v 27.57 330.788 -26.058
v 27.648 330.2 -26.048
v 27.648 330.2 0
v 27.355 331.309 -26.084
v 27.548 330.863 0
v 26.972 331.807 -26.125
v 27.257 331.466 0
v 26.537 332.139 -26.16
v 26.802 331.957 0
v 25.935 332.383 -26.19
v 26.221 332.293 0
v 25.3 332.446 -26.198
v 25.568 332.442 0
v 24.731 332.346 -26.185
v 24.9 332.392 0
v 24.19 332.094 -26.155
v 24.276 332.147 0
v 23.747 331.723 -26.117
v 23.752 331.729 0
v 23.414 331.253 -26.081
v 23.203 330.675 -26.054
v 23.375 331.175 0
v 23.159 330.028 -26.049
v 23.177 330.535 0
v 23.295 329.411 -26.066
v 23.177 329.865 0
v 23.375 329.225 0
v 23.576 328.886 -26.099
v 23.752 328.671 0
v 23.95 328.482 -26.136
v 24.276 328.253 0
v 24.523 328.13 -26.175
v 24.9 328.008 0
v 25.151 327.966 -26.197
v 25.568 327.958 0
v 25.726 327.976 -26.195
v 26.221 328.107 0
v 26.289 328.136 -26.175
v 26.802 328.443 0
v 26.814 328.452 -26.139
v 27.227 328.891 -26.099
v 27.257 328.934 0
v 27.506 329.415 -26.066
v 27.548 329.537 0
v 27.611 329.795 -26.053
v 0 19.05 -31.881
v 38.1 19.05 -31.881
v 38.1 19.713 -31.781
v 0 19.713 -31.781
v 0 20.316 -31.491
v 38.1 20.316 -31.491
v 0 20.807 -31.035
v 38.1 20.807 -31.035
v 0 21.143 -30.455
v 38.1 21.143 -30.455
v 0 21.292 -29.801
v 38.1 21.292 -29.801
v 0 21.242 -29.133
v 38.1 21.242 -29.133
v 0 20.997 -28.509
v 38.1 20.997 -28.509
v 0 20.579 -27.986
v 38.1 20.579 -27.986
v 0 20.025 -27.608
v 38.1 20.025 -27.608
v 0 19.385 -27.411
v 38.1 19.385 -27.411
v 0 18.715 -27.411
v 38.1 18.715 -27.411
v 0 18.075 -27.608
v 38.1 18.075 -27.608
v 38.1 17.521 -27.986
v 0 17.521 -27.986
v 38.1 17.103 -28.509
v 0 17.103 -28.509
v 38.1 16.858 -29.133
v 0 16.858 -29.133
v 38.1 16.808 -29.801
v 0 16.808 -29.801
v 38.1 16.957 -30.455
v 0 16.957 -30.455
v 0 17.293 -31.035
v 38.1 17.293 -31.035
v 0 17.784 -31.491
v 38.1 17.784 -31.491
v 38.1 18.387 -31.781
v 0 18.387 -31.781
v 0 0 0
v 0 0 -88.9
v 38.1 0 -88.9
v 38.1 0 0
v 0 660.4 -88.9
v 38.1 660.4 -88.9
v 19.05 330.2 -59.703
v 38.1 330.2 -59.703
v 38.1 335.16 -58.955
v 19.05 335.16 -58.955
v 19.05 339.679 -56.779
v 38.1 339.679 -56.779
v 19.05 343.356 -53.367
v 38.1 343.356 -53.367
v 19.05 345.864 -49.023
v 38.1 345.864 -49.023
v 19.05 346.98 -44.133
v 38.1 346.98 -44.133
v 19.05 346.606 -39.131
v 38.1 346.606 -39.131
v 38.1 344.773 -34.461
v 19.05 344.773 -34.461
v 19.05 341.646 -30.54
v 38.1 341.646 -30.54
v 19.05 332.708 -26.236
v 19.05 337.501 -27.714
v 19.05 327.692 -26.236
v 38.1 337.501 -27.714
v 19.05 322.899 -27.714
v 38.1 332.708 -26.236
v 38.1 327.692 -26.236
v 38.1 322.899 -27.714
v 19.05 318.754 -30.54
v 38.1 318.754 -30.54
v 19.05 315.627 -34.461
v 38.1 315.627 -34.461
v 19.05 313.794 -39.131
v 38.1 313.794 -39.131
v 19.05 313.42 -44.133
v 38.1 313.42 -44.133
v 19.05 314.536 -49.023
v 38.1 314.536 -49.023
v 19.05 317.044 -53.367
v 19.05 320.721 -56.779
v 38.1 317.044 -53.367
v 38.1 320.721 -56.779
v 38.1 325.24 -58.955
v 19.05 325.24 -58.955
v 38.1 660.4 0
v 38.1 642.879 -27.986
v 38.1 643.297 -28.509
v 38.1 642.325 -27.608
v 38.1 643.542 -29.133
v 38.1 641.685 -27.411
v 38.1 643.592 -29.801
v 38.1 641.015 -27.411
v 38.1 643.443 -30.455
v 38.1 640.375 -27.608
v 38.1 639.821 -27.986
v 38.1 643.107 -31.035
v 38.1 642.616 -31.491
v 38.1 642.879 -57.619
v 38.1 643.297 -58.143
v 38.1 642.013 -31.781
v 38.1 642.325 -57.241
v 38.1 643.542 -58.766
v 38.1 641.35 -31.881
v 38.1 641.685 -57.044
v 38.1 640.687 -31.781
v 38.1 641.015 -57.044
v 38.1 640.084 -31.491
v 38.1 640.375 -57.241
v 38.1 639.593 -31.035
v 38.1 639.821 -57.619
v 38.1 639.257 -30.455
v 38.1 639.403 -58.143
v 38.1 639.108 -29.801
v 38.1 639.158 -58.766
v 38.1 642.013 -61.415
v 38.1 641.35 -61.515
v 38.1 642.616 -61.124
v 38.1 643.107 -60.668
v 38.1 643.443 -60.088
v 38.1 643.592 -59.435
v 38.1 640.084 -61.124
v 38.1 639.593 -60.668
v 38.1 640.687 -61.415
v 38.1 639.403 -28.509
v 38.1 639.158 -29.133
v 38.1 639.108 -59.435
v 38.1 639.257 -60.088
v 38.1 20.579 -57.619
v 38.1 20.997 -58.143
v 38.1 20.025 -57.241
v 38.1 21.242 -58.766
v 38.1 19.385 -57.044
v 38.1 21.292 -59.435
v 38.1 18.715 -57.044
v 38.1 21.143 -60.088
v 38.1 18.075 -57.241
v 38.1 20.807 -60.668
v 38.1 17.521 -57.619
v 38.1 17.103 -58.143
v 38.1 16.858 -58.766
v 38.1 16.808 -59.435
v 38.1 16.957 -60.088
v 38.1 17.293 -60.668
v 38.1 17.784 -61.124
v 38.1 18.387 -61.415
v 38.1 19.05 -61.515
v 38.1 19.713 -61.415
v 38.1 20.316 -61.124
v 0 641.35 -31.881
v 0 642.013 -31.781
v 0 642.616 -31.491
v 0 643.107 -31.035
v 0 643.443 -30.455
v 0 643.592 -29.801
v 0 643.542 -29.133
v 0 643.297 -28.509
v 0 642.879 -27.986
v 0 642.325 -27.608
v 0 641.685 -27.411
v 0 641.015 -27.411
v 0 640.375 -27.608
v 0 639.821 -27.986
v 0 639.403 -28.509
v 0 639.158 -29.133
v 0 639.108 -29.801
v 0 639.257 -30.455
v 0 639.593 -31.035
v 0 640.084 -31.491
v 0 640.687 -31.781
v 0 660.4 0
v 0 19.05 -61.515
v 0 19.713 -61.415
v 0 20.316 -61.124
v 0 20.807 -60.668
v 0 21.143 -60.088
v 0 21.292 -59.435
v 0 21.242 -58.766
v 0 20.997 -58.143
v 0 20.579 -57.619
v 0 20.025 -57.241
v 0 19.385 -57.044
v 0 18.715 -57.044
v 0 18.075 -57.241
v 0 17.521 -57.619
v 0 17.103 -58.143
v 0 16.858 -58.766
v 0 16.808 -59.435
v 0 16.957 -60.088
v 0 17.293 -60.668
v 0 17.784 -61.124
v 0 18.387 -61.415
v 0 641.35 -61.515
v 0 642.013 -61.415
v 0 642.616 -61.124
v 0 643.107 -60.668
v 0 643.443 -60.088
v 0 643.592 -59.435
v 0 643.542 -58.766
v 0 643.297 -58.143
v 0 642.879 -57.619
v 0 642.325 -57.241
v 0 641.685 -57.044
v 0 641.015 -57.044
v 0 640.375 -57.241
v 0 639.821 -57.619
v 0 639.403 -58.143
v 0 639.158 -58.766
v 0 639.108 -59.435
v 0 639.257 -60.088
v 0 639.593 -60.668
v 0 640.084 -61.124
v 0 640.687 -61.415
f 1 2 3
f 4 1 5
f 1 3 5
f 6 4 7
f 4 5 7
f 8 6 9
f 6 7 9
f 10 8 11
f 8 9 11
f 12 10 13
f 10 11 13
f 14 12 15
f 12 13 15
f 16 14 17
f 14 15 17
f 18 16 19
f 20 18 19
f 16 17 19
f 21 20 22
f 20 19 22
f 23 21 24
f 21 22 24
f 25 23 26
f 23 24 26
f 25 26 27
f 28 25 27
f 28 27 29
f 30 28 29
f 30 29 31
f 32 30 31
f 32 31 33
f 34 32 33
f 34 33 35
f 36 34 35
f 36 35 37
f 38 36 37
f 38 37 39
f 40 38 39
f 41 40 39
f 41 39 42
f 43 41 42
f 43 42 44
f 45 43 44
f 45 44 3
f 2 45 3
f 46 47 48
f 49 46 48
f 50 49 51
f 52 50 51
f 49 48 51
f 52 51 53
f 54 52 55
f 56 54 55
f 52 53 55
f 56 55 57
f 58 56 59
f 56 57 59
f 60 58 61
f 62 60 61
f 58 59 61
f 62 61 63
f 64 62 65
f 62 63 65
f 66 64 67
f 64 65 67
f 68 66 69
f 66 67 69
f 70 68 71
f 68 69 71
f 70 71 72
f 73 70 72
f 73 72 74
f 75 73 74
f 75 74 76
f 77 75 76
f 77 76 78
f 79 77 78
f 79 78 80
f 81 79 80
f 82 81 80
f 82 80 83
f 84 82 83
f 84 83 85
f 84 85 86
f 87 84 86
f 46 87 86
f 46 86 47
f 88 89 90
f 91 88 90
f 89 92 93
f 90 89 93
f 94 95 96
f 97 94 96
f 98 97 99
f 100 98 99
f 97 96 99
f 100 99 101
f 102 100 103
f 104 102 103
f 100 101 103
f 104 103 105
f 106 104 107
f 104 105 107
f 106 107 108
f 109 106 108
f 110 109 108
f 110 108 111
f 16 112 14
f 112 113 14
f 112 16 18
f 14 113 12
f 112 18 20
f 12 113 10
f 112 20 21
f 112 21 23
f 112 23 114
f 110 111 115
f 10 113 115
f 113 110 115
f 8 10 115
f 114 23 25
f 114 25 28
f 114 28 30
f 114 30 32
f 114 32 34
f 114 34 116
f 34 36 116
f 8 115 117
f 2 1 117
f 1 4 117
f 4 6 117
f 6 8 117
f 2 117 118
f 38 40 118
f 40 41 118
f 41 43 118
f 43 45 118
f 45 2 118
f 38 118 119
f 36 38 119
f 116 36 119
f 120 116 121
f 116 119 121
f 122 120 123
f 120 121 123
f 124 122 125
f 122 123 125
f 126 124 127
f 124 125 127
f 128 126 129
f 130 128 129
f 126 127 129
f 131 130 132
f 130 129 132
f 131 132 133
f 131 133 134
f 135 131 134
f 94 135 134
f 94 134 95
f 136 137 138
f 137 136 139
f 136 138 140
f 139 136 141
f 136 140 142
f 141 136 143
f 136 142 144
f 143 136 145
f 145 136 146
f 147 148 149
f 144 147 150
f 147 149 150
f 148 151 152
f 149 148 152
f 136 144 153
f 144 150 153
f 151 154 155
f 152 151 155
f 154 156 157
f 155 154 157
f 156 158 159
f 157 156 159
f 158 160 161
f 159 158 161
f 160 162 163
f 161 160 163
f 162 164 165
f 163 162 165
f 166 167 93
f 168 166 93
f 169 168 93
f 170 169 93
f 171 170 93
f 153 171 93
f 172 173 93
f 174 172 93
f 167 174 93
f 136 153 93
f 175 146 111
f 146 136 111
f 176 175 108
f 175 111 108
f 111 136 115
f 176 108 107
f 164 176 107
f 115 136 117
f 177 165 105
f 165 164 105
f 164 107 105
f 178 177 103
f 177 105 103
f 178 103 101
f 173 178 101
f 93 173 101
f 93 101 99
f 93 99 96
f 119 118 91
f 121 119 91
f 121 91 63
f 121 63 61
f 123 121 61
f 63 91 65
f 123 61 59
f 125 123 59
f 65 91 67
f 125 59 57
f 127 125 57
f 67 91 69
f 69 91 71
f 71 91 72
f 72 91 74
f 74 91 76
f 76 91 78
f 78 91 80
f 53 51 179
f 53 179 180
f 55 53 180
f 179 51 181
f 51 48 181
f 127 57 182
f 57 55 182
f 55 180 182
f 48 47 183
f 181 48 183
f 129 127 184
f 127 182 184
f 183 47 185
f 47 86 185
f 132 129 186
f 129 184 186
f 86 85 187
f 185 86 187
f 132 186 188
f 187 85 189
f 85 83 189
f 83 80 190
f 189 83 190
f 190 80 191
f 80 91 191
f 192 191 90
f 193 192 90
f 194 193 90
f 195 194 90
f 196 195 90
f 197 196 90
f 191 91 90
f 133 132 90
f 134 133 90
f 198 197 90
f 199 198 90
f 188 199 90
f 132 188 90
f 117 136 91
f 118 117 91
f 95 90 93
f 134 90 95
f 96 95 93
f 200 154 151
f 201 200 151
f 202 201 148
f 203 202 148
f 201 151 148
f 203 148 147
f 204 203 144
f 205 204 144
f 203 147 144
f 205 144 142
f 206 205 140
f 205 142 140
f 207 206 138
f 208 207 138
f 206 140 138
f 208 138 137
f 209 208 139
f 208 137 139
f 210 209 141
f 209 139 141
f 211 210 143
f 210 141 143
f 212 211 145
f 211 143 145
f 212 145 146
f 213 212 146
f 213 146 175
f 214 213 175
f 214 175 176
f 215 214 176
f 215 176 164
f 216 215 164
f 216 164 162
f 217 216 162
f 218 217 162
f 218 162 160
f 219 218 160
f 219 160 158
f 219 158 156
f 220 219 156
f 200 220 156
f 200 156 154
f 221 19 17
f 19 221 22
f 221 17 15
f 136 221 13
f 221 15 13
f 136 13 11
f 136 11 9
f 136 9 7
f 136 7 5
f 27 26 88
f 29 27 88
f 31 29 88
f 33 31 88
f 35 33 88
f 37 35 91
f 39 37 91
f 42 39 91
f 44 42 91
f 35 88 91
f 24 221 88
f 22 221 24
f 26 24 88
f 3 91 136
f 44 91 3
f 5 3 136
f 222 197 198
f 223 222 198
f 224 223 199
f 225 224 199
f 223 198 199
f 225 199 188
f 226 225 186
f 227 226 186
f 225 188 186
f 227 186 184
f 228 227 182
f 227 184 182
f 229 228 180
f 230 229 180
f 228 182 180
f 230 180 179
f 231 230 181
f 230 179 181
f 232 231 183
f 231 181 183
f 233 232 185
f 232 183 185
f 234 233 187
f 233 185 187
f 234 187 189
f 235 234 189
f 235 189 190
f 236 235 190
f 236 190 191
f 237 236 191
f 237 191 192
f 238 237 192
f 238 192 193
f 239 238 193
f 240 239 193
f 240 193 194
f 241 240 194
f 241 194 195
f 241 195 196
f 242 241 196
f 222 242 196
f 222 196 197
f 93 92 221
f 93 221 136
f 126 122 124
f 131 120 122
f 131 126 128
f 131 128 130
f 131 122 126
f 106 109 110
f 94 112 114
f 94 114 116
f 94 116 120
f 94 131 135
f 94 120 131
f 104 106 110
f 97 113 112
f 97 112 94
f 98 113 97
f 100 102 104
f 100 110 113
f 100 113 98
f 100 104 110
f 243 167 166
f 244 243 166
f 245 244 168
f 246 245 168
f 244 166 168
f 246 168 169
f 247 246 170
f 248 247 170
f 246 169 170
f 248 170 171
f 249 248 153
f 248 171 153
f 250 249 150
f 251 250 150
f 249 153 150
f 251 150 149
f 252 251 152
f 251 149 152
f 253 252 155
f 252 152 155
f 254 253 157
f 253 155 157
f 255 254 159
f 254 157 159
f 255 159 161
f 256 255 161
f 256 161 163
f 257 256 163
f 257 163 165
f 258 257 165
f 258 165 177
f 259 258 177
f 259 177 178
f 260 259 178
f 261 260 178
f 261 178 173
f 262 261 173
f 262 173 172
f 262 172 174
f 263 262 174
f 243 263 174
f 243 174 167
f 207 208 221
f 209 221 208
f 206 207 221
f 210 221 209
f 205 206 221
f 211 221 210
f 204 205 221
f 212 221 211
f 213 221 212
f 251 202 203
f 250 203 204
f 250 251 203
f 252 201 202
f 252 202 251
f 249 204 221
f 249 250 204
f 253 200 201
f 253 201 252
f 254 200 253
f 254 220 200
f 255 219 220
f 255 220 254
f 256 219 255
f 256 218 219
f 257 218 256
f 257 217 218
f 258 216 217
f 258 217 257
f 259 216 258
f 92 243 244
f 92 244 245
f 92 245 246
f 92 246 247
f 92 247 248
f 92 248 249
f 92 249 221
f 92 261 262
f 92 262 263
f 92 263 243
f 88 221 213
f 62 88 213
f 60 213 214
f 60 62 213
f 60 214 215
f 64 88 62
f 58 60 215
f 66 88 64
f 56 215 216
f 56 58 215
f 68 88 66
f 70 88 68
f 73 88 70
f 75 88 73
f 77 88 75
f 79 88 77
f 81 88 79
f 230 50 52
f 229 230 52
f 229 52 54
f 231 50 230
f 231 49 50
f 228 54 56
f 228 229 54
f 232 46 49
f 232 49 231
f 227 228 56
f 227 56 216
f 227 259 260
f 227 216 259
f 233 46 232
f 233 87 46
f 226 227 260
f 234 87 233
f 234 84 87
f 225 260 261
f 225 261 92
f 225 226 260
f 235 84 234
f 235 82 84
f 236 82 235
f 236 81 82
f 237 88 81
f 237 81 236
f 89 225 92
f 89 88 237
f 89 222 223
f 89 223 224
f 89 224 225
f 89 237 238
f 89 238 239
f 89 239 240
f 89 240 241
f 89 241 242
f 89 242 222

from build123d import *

# Parameters (mm, degrees)
SKETCH1_W               = 38.1
SKETCH1_H               = 88.9
BOSS_EXTRUDE1_DEPTH     = 660.4
SKETCH2_R               = 16.8275
CUT_EXTRUDE1_DEPTH      = 19.05
CUT_EXTRUDE2_REACH      = 669.445
CUT_EXTRUDE2_END_RADIUS = 16.8275
SKETCH3_R               = 2.2479
SKETCH4_R               = 2.2479
CUT_EXTRUDE3_DEPTH      = 668.445113848


with BuildPart() as part:
    # Sketch1 → Boss-Extrude1 (new body)
    with BuildSketch(Plane(origin=(0, 0, 0), x_dir=(1, 0, 0), z_dir=(0, 1, 0))):
        with Locations((19.05, 44.45)):
            Rectangle(SKETCH1_W, SKETCH1_H)
    extrude(amount=BOSS_EXTRUDE1_DEPTH)

    # Sketch2 → Cut-Extrude1 (cut)
    with BuildSketch(Plane(origin=(38.1, 0, 0), x_dir=(0, 0, -1), z_dir=(1, 0, 0))):
        with Locations((42.8752, 330.2)):
            Circle(SKETCH2_R)
    extrude(amount=-CUT_EXTRUDE1_DEPTH, mode=Mode.SUBTRACT)

    # Cut-Extrude2: up to this cylinder (the profile starts outside it)
    cut_extrude2_end = Plane(origin=(25.4, 330.2, -42.8752), z_dir=(1, 0, 0)) * Cylinder(CUT_EXTRUDE2_END_RADIUS, 1373.545, mode=Mode.PRIVATE)
    # Sketch3 → Cut-Extrude2 (cut, up to the surface)
    with BuildSketch(Plane.XY, mode=Mode.PRIVATE) as cut_extrude2_sk1:
        with Locations((25.4, 330.2)):
            Circle(SKETCH3_R)
    cut_extrude2_tool1 = extrude(cut_extrude2_sk1.sketch, amount=-CUT_EXTRUDE2_REACH, mode=Mode.PRIVATE) - cut_extrude2_end
    add(cut_extrude2_tool1.solids().sort_by_distance((25.4, 330.2, 0))[0], mode=Mode.SUBTRACT)

    # Sketch4 → Cut-Extrude3 (cut, through all)
    with BuildSketch(Plane(origin=(38.1, 0, 0), x_dir=(0, 0, -1), z_dir=(1, 0, 0))):
        with Locations((59.266666667, 19.05)):
            Circle(SKETCH4_R)
        with Locations((29.633333333, 19.05)):
            Circle(SKETCH4_R)
        with Locations((59.266666667, 641.35)):
            Circle(SKETCH4_R)
        with Locations((29.633333333, 641.35)):
            Circle(SKETCH4_R)
    extrude(amount=-CUT_EXTRUDE3_DEPTH, mode=Mode.SUBTRACT)


solid = part.part
